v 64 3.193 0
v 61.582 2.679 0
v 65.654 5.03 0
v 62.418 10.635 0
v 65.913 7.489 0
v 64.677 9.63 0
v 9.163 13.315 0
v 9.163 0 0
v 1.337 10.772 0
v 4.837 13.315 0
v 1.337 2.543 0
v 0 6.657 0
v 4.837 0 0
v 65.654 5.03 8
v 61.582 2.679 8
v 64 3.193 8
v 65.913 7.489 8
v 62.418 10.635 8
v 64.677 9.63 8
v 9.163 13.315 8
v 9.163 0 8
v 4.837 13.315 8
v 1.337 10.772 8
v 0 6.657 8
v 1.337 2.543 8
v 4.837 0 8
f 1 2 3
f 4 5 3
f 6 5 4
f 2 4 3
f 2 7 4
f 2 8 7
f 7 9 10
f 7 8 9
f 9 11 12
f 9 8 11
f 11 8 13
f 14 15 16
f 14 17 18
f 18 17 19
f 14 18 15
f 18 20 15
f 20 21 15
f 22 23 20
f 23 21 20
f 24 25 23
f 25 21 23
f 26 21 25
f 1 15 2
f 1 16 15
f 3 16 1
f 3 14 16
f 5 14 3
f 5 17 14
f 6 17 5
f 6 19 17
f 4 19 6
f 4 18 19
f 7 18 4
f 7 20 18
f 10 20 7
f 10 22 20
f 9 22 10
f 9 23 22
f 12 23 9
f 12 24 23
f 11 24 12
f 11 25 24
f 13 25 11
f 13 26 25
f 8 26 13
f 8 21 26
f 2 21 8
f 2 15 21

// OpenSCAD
$fn = 32;

// ----------------------------------------------------------------------
// Lever arm: two bosses 14 and 8 mm, 55 mm between centres
// ----------------------------------------------------------------------

// --- parameters (mm) ---
profile_height = 8;       // extrusion height
profile_points = 13;      // points of the closed outline

profile = [[0, 6.657], [1.337, 2.543], [4.837, 0], [9.163, 0], [61.582, 2.679], [64, 3.193], [65.654, 5.03], [65.913, 7.489], [64.677, 9.63], [62.418, 10.635], [9.163, 13.315], [4.837, 13.315], [1.337, 10.772]];  // single closed polygon, 13 points, counter clockwise

// --- the one profile operation ---
linear_extrude(height = profile_height) polygon(points = profile);
